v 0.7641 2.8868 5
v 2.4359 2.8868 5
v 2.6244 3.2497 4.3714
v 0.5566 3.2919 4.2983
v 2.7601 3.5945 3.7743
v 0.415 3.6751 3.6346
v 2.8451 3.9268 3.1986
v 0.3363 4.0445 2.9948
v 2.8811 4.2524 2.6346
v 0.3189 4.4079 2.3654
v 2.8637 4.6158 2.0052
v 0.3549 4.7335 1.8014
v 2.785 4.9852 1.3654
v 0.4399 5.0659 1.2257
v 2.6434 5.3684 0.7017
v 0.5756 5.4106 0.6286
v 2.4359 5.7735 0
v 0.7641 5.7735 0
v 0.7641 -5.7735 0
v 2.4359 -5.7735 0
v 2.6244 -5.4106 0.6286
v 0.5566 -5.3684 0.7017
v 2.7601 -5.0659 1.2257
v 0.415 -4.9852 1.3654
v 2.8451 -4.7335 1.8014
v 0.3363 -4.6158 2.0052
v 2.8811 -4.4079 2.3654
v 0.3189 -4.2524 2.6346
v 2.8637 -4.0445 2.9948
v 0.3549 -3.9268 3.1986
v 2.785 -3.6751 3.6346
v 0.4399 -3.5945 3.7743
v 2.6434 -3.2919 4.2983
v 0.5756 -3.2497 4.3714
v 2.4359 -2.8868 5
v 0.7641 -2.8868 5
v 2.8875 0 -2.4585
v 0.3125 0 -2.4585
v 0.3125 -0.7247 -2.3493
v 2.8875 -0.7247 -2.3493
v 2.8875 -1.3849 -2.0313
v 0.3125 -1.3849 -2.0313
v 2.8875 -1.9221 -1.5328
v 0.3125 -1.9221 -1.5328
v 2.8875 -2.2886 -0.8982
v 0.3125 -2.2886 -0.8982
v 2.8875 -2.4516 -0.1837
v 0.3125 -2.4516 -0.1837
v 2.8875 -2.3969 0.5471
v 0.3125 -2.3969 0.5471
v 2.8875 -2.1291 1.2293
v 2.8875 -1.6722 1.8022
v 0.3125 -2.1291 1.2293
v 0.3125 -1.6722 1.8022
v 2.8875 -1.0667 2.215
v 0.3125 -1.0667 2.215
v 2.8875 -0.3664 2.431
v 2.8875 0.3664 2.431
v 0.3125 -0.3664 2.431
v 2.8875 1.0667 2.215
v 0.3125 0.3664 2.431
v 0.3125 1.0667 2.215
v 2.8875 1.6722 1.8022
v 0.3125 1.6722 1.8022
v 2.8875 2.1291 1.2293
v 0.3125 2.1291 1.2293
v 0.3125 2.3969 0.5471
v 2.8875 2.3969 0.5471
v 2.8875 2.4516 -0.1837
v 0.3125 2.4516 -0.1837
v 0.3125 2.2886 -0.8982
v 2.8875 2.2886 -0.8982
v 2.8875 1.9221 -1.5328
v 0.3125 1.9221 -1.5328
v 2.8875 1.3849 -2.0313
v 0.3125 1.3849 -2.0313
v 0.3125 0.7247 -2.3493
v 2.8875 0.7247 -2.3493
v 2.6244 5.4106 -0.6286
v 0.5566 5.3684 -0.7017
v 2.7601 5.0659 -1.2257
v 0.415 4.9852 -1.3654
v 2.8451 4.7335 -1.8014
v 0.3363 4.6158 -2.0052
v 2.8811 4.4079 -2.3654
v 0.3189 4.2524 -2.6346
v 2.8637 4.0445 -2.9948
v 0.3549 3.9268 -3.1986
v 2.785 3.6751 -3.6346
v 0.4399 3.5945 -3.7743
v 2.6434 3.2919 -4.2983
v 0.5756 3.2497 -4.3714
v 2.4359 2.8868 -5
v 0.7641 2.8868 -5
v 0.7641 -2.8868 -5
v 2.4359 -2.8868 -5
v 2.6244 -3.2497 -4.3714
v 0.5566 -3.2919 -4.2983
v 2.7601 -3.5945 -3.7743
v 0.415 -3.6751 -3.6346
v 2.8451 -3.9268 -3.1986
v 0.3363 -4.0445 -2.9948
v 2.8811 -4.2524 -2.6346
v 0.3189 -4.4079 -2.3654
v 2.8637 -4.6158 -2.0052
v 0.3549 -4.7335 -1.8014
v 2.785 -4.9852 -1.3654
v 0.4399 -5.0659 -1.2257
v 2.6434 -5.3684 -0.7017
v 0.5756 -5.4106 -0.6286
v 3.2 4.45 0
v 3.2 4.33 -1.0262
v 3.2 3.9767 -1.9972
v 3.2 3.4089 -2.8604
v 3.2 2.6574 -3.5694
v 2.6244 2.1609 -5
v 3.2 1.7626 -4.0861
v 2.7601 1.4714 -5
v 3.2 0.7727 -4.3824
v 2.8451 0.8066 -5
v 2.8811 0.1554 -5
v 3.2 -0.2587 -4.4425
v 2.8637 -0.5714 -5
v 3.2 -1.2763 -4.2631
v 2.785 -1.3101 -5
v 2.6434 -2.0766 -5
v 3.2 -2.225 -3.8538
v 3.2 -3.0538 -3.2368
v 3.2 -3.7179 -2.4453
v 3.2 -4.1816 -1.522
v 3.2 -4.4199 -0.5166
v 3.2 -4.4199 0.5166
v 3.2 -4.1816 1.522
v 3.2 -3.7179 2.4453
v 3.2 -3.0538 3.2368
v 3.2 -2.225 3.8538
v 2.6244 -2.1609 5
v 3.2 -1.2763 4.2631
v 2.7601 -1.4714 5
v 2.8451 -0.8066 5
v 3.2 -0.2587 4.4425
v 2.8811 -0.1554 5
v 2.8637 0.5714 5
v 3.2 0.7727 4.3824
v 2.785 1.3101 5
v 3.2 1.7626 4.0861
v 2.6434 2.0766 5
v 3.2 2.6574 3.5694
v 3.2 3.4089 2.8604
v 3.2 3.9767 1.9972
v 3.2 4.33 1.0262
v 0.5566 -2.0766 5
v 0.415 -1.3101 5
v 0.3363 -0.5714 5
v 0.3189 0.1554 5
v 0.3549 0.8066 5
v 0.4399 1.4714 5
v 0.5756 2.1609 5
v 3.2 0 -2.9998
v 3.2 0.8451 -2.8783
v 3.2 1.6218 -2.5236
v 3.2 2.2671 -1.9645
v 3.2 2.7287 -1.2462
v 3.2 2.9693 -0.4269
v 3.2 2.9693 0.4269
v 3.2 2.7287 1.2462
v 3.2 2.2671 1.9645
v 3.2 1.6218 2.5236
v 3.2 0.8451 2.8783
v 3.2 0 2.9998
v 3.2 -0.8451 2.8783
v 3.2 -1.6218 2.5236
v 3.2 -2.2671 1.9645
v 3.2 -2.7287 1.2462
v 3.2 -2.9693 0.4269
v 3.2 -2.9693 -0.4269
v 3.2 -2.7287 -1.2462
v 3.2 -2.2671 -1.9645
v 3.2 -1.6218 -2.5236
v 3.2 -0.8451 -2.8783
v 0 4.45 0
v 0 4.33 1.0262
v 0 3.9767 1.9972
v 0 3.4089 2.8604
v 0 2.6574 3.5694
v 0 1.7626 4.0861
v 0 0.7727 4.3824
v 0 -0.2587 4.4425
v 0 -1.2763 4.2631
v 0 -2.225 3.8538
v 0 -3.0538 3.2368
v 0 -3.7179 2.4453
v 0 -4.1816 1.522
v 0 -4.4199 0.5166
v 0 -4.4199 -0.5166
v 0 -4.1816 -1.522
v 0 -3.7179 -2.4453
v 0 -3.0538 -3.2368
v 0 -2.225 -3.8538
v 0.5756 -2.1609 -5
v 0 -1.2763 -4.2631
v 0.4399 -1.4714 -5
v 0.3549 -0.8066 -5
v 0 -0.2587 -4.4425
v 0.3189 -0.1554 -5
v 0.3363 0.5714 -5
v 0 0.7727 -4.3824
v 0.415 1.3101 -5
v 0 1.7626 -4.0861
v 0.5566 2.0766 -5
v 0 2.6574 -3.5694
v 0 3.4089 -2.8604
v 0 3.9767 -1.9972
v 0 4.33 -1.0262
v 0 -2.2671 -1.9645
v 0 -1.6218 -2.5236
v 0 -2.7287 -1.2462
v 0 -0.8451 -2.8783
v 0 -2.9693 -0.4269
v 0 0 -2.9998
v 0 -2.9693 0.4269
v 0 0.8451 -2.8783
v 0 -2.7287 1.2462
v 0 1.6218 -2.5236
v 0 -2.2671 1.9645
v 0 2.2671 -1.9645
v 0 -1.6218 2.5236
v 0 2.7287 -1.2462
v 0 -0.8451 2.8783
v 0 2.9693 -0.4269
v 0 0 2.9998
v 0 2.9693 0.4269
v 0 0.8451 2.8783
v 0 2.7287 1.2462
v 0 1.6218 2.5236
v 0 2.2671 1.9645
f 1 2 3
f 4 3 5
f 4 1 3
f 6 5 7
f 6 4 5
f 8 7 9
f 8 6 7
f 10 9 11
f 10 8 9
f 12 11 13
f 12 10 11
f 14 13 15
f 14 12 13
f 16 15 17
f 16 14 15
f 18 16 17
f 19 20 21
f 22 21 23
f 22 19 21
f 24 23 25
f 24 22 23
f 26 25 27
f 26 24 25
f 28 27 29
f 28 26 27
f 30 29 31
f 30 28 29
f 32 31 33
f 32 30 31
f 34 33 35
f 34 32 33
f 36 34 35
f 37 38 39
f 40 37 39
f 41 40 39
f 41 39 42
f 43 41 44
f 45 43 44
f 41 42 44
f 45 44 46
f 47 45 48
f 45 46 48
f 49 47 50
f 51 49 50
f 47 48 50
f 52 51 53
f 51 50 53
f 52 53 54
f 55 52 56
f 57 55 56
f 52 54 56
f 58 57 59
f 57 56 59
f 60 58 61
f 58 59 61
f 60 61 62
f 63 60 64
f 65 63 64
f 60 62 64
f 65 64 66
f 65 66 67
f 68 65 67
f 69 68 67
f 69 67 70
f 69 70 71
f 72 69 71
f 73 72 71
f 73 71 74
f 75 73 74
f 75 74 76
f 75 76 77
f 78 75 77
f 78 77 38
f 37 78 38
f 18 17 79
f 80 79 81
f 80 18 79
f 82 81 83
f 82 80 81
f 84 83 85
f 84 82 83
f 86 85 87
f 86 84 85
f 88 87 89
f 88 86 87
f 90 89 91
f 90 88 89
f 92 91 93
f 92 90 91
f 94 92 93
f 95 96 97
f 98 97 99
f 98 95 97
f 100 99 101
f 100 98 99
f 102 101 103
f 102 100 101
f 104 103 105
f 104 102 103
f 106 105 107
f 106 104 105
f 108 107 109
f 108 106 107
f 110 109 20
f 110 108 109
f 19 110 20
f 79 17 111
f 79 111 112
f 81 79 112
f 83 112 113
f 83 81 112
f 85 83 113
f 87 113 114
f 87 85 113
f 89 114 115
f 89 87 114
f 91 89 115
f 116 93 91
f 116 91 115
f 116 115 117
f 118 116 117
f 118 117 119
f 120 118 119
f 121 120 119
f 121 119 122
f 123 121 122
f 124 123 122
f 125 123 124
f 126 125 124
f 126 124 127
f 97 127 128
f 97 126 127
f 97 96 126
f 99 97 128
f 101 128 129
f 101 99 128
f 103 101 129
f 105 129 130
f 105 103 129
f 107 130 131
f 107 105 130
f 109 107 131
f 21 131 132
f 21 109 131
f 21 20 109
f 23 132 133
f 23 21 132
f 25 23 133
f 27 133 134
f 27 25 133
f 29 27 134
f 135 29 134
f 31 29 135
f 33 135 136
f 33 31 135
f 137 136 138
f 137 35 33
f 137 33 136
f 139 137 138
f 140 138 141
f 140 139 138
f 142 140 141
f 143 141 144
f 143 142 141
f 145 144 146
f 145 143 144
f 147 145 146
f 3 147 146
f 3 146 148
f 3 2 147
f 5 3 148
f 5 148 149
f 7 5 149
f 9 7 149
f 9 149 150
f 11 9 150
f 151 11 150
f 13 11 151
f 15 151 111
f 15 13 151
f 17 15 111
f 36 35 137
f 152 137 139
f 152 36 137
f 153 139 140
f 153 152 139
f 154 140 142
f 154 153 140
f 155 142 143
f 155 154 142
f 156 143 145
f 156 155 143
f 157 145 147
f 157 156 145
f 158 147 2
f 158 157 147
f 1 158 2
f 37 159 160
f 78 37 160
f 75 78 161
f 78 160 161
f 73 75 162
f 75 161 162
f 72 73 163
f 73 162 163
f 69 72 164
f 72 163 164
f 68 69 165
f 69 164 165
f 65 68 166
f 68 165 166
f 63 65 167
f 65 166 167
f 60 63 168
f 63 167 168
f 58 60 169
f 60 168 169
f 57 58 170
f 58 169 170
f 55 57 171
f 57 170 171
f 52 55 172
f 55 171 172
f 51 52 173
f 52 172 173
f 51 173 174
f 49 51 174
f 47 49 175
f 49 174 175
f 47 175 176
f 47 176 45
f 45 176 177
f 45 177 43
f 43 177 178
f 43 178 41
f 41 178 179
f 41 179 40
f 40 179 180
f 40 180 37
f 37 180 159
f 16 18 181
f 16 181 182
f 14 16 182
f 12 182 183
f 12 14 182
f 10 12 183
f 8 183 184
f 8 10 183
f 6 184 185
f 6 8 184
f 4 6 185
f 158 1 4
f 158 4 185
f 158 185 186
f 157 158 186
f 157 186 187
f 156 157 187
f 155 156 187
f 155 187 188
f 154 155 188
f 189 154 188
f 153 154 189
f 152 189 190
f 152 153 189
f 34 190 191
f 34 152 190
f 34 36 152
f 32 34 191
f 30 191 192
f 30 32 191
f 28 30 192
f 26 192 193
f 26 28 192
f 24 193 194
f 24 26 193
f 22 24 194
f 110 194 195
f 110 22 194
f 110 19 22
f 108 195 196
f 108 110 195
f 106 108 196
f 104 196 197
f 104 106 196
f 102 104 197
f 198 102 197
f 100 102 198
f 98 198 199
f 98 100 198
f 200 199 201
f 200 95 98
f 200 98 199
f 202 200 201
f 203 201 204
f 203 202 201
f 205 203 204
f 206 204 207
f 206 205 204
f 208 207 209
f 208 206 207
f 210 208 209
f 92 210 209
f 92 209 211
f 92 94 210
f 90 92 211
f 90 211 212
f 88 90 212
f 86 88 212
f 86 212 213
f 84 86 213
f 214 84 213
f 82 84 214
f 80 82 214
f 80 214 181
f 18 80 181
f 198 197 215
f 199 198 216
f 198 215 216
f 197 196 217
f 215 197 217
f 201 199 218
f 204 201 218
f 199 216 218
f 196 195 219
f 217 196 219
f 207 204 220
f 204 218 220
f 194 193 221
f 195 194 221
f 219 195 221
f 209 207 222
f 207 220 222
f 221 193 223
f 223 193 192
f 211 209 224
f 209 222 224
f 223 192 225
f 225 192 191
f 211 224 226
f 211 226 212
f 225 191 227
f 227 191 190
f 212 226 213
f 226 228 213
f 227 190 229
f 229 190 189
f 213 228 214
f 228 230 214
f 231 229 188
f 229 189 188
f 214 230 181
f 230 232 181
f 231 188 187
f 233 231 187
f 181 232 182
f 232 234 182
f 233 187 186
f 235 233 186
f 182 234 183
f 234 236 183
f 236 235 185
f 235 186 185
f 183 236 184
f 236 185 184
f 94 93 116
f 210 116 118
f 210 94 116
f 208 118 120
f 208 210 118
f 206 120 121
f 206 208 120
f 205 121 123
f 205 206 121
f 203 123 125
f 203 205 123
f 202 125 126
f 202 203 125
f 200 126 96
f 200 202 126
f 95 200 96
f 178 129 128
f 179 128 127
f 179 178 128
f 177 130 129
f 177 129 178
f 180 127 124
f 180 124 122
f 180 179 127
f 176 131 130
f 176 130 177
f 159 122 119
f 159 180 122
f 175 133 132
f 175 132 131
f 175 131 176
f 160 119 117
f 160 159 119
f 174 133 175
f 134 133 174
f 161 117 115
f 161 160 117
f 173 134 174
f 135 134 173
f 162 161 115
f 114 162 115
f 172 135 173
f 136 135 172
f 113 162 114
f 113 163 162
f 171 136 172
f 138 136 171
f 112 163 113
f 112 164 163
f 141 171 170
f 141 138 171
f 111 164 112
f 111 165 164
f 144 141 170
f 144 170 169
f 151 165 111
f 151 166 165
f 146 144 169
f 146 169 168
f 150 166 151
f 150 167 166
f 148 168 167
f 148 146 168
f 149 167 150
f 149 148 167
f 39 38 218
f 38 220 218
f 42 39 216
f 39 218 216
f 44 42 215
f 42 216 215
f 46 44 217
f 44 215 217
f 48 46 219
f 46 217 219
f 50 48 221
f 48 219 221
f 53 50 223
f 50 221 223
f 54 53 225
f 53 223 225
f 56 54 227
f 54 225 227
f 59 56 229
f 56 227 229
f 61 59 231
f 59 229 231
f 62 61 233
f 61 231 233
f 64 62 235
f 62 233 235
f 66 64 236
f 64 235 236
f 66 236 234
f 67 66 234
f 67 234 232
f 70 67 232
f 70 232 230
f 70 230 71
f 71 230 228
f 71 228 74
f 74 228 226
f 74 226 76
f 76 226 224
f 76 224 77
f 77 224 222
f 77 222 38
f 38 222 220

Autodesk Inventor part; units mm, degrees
ref_plane "YZ Plane" through (0, 0, 0) normal (1, 0, 0) x (0, 1, 0)
ref_plane "XZ Plane" through (0, 0, 0) normal (0, 1, 0) x (-1, 0, 0)
sketch "Szkic1" plane through (0, 0, 0) normal (1, 0, 0) x (0, 1, 0)
  line L0 (-5.7735, 0) -> (-2.8868, 5)
  line L1 (-2.8868, 5) -> (2.8868, 5)
  line L2 (2.8868, 5) -> (5.7735, 0)
  line L3 (5.7735, 0) -> (2.8868, -5)
  line L4 (2.8868, -5) -> (-2.8868, -5)
  line L5 (-2.8868, -5) -> (-5.7735, 0)
  point P0 (0, 0)
  point P1 (0, 0)
  dimension "d0" = 11.547
extrude "Bryła" add sketch "Szkic1" along normal blind 3.2
sketch "Szkic2" plane through (0, 0, 0) normal (0, 0, 1) x (1, 0, 0)
  line L0 (0, 2.8868) -> (0, 5.7735) projected
  line L1 (0, 5.7735) -> (3.2, 5.7735) projected
  line L2 (3.2, 2.8868) -> (3.2, 5.7735) projected
  line L3 (-0.64, 0) -> (3.84, 0) projected
  line L4 (0.7641, 5.7735) -> (0, 4.45)
  line L5 (2.4359, 5.7735) -> (3.2, 4.45)
  dimension "d3" = 30
  dimension "d4" = 30
  dimension "d5" = 8.9
  dimension "d6" = 8.9
revolve "Faza1" cut sketch "Szkic2" angle 360 about axis through (-10, 0, 0) along (1, 0, 0)
sketch "Szkic3" plane through (3.2, 0, 0) normal (1, 0, 0) x (0, 0, -1)
  arc A0 (-0.625, -1.0825) -> (0.625, -1.0825) centre (0, 0) ccw projected
hole "Gwint" at (3.2, 0, 0) direction (-1, 0, 0) diameter 4.917 end through all thread size "M6x1" class "6H" standard "ISO Metric profile"
chamfer "Faza2" distance 0.5413 angle 30 1 edges at (3.2, 0, 2.4585) measured on face at (3.2, 3.7371, -0.4538)
chamfer "Faza3" distance 0.5413 angle 30 1 edges at (0, 0, 2.4585) measured on face at (0, 3.7371, -0.4538)
ref_plane "Work Plane1" through (-12.4358, 0, 0) normal (0, -0.8660254, -0.5) x (1, 0, 0)
equation "\"d0\" = 1.1547 * SW"
equation "\"d1\" = KOH"
equation "\"d3\" = ANG1"
equation "\"d4\" = ANG2"
equation "\"d5\" = SW0"
equation "\"d6\" = SW01"
equation "\"d8\" = -0.5 * GD1 + 0.5 * NND"
equation "\"d40\" = -0.5 * GD1 + 0.5 * NND"
equation "\"d10\" = -0.5 * GD1 + 0.5 * NND"
equation "\"d41\" = -0.5 * GD1 + 0.5 * NND"
equation "\"ANG1\" = 30deg"
equation "\"ANG2\" = 30deg"
equation "\"NND\" = 6"
equation "\"KOH\" = 3.2"
equation "\"SW0\" = 8.9"
equation "\"SW01\" = SW0"
equation "\"GUL\" = 0.541266 * PTC"
equation "\"THREADDIA\" = 6"
equation "\"TOA\" = 30deg"
equation "\"PTC\" = 1"
equation "\"E0\" = 1.155 * SW"
equation "\"GAL\" = 0.541266 * PTC"
equation "\"SW\" = 10"
equation "\"GD1\" = 4.917468"
properties part number "ISO 4035 - M6" material "Stal nierdzewna 440C"
